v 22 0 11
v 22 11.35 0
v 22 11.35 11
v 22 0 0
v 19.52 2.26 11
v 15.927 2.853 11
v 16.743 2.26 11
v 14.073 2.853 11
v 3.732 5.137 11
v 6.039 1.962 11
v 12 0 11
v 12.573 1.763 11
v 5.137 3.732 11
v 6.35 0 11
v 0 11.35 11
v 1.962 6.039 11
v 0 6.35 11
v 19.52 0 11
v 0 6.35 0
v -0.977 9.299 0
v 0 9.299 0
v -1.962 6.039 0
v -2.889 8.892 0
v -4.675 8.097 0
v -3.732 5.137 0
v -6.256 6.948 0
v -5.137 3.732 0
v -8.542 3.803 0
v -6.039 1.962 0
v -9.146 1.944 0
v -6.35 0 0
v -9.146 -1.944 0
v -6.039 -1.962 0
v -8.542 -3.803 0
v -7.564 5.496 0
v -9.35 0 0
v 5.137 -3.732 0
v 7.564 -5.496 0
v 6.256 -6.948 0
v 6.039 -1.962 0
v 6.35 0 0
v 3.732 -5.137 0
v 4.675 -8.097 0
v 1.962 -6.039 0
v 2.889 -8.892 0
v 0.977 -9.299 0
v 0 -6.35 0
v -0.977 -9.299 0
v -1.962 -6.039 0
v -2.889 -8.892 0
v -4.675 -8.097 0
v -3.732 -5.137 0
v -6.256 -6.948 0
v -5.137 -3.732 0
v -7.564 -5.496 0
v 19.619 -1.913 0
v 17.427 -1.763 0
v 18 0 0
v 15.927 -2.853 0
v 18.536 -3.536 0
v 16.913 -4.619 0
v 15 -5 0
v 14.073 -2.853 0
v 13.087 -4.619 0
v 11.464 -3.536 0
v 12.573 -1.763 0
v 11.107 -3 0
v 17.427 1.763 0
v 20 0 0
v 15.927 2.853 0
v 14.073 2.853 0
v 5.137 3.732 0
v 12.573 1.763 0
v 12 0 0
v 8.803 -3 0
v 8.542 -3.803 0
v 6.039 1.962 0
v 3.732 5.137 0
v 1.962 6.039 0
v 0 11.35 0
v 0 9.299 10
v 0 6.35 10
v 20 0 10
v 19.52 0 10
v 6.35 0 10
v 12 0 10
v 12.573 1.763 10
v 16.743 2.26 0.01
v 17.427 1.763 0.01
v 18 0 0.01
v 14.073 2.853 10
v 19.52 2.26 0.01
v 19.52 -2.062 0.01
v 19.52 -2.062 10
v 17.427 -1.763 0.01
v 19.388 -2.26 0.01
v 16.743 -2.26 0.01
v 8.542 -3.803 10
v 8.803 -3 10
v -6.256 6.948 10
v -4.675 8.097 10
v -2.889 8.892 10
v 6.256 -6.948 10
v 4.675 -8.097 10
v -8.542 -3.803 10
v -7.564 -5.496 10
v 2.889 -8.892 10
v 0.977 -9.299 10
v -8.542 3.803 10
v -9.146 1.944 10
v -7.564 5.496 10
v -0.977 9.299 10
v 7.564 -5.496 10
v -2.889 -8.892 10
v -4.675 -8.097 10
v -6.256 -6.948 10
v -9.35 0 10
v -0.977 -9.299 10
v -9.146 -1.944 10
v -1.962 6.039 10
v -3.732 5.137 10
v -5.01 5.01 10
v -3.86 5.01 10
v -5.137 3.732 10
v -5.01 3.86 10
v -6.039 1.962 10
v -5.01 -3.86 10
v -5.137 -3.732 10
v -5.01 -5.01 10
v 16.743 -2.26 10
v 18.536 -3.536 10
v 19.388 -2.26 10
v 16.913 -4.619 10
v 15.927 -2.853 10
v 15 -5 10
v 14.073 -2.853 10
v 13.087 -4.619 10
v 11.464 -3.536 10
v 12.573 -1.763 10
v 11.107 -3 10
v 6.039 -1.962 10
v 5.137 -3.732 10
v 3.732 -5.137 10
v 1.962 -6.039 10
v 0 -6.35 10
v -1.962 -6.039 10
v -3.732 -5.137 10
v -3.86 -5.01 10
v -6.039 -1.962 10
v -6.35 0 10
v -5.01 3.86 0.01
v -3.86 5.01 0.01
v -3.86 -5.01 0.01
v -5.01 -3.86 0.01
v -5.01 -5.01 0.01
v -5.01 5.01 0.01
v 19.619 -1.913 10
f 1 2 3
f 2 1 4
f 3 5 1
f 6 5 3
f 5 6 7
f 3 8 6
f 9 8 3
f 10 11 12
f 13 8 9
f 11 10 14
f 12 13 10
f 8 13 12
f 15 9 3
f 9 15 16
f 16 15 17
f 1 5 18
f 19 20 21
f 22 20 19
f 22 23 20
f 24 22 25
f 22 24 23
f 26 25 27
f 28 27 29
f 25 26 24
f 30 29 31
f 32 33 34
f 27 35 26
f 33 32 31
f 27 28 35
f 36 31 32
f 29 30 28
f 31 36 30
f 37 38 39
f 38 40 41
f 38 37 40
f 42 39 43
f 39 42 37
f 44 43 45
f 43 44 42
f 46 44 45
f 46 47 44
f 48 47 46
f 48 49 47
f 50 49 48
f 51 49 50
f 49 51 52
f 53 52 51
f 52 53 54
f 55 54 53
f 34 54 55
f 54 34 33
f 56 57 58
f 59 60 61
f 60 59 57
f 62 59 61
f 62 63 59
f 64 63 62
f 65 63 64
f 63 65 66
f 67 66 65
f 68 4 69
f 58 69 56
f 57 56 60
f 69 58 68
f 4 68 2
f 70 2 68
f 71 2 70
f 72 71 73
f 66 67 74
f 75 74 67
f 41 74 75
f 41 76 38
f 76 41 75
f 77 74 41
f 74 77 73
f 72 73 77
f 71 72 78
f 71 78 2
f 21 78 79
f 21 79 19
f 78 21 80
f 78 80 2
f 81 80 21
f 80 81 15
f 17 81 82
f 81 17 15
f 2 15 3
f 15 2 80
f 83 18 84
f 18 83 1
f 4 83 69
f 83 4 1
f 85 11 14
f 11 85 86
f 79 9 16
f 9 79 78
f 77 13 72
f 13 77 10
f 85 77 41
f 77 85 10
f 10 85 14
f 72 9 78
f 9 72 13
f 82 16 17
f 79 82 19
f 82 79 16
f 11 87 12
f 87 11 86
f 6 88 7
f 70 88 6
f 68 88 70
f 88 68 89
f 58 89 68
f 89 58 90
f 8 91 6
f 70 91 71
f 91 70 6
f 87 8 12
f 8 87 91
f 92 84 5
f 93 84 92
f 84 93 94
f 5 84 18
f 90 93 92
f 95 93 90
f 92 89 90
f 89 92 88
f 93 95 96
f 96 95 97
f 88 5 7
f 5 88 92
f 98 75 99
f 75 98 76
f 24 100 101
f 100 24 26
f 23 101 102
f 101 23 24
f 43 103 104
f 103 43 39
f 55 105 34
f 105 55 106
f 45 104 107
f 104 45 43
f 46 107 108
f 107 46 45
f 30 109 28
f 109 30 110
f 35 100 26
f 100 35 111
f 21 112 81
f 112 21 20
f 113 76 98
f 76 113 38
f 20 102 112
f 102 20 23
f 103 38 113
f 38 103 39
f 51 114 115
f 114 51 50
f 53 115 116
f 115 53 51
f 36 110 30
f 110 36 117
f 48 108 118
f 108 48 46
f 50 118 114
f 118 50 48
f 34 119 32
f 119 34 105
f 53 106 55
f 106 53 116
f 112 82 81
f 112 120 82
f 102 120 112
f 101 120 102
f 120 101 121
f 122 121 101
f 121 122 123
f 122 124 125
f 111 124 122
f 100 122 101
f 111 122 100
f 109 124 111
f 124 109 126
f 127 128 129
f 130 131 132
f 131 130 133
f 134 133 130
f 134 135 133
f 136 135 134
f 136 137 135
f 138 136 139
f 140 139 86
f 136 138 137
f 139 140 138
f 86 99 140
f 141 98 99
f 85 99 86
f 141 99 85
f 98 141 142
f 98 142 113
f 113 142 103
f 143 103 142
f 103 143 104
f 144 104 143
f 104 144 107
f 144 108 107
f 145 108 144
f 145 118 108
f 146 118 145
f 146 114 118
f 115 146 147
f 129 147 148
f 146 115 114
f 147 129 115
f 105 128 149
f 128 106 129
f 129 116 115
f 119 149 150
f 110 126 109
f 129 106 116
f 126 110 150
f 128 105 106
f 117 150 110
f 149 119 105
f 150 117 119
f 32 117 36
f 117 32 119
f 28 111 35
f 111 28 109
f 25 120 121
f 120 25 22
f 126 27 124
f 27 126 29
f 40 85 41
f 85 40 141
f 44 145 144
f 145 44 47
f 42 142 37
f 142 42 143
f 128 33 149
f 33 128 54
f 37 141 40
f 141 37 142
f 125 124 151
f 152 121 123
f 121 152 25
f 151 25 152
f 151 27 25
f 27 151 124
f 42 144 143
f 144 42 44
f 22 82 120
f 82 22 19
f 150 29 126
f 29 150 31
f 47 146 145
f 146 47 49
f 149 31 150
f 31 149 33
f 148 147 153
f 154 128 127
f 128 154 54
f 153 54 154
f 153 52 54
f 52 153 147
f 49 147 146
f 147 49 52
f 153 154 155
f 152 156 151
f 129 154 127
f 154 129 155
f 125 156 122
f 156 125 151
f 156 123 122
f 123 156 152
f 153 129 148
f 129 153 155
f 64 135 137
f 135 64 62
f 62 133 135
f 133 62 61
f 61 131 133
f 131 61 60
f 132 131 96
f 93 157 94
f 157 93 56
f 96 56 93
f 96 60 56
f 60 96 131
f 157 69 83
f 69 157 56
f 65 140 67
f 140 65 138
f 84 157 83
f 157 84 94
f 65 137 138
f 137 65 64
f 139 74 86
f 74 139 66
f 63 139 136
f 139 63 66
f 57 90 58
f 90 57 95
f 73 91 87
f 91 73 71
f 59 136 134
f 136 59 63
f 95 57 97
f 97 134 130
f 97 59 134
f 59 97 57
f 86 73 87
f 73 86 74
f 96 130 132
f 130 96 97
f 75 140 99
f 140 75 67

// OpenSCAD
// Snap-on Clip for Lab Stand Rod and Tubing
// Orientation: Flat on XY plane, building up in +Z.
// Units: Millimetres.

// --- Dimensions ---
// Rod Ring
$rod_id = 12.7;      // Inner diameter (mm)
$rod_wall = 3.0;     // Wall thickness (mm)
$rod_od = $rod_id + 2 * $rod_wall; // Outer diameter (mm)
$rod_z = 10.0;       // Height of extrusion (mm)

// Tubing Ring
$tube_id = 6.0;      // Inner diameter (mm)
$tube_wall = 2.0;    // Wall thickness (mm)
$tube_od = $tube_id + 2 * $tube_wall; // Outer diameter (mm)
$tube_x = 15.0;      // Center X position (mm)

// Bridge
$bridge_width = 6.0; // Width in Y (mm)
$bridge_x_start = 8.0; // Start X (mm)
$bridge_x_end = 12.0;  // End X (mm)

// Cutouts (Openings)
// Rod Ring Cutout: -X side, width 10mm, centered at y=0
$rod_cut_width = 10.0;
$rod_cut_y_half = $rod_cut_width / 2;

// Tubing Ring Cutout: +X side, width 4.5mm, centered at y=0
$tube_cut_width = 4.5;
$tube_cut_y_half = $tube_cut_width / 2;

// --- Geometry ---

// We will build the part by creating a large bounding box and subtracting the voids.
// This ensures a single solid object.

difference() {
    // 1. Main Bounding Box
    // Extends far enough to cover all features + cutout extensions
    $max_x = $tube_x + $tube_od/2 + 2;
    $max_y = max($rod_od/2, $tube_od/2) + 2;
    $max_z = $rod_z + 1;
    
    cube([ $max_x, $max_y, $max_z ]);

    // 2. Rod Ring Void (The empty space inside the ring and the cutout)
    // The ring is centered at (0,0).
    // Void 1: Inner circle of the rod ring
    cylinder(h = $rod_z + 1, d = $rod_id, center = [0,0,0]);
    
    // Void 2: The cutout on the -X side.
    // Defined as x < 0, -5 < y < 5.
    // We subtract a rectangle that covers this area.
    translate([-5.01, -5.01, 0.01]) 
        cube([5.01, 10.02, $rod_z + 1]);

    // 3. Tubing Ring Void
    // The ring is centered at ($tube_x, 0).
    // Void 1: Inner circle of the tubing ring
    translate([$tube_x, 0, 0]) 
        cylinder(h = $rod_z + 1, d = $tube_id, center = [0,0,0]);
    
    // Void 2: The cutout on the +X side.
    // Defined as x > $tube_x, -2.25 < y < 2.25.
    translate([$tube_x + 0.01, -2.26, 0.01]) 
        cube([4.51, 4.52, $rod_z + 1]);

    // 4. Bridge Void
    // The bridge is a solid block at x=8 to 12, y=-3 to 3.
    // We must subtract the space *around* this block to leave the bridge.
    // However, since we are subtracting voids from a big box, we need to subtract the 
    // "negative" of the bridge.
    // The bridge occupies: x in [8, 12], y in [-3, 3], z in [0, 10].
    // To leave this solid, we do NOT subtract this region.
    // Instead, we subtract the regions that are NOT the bridge but are inside the bounding box?
    // No, that's complex.
    
    // Simpler approach: Construct the positive geometry by unioning the three parts.
    // This is often more robust for complex shapes than subtracting voids from a box.
}

// Let's restart the logic with a Union of positive parts, which is cleaner.
// We define the three parts as solids with their holes/cutouts already removed.

union() {
    // Part A: Rod Ring
    // Centered at (0,0).
    // Solid ring with inner hole and -X cutout.
    difference() {
        // Outer cylinder
        cylinder(h = $rod_z, d = $rod_od, center = [0,0,0]);
        
        // Inner hole
        cylinder(h = $rod_z + 0.1, d = $rod_id, center = [0,0,0]);
        
        // Cutout on -X side
        translate([-5.01, -5.01, 0.01]) 
            cube([5.01, 10.02, $rod_z + 0.1]);
    }

    // Part B: Tubing Ring
    // Centered at ($tube_x, 0).
    // Solid ring with inner hole and +X cutout.
    translate([$tube_x, 0, 0]) {
        difference() {
            // Outer cylinder
            cylinder(h = $rod_z, d = $tube_od, center = [0,0,0]);
            
            // Inner hole
            cylinder(h = $rod_z + 0.1, d = $tube_id, center = [0,0,0]);
            
            // Cutout on +X side
            translate([0.01, -2.26, 0.01]) 
                cube([4.51, 4.52, $rod_z + 0.1]);
        }
    }

    // Part C: Solid Bridge
    // Joins x=8 to x=12, width 6mm in Y.
    translate([$bridge_x_start, -($bridge_width/2), 0]) {
        cube([$bridge_x_end - $bridge_x_start, $bridge_width, $rod_z]);
    }
}
